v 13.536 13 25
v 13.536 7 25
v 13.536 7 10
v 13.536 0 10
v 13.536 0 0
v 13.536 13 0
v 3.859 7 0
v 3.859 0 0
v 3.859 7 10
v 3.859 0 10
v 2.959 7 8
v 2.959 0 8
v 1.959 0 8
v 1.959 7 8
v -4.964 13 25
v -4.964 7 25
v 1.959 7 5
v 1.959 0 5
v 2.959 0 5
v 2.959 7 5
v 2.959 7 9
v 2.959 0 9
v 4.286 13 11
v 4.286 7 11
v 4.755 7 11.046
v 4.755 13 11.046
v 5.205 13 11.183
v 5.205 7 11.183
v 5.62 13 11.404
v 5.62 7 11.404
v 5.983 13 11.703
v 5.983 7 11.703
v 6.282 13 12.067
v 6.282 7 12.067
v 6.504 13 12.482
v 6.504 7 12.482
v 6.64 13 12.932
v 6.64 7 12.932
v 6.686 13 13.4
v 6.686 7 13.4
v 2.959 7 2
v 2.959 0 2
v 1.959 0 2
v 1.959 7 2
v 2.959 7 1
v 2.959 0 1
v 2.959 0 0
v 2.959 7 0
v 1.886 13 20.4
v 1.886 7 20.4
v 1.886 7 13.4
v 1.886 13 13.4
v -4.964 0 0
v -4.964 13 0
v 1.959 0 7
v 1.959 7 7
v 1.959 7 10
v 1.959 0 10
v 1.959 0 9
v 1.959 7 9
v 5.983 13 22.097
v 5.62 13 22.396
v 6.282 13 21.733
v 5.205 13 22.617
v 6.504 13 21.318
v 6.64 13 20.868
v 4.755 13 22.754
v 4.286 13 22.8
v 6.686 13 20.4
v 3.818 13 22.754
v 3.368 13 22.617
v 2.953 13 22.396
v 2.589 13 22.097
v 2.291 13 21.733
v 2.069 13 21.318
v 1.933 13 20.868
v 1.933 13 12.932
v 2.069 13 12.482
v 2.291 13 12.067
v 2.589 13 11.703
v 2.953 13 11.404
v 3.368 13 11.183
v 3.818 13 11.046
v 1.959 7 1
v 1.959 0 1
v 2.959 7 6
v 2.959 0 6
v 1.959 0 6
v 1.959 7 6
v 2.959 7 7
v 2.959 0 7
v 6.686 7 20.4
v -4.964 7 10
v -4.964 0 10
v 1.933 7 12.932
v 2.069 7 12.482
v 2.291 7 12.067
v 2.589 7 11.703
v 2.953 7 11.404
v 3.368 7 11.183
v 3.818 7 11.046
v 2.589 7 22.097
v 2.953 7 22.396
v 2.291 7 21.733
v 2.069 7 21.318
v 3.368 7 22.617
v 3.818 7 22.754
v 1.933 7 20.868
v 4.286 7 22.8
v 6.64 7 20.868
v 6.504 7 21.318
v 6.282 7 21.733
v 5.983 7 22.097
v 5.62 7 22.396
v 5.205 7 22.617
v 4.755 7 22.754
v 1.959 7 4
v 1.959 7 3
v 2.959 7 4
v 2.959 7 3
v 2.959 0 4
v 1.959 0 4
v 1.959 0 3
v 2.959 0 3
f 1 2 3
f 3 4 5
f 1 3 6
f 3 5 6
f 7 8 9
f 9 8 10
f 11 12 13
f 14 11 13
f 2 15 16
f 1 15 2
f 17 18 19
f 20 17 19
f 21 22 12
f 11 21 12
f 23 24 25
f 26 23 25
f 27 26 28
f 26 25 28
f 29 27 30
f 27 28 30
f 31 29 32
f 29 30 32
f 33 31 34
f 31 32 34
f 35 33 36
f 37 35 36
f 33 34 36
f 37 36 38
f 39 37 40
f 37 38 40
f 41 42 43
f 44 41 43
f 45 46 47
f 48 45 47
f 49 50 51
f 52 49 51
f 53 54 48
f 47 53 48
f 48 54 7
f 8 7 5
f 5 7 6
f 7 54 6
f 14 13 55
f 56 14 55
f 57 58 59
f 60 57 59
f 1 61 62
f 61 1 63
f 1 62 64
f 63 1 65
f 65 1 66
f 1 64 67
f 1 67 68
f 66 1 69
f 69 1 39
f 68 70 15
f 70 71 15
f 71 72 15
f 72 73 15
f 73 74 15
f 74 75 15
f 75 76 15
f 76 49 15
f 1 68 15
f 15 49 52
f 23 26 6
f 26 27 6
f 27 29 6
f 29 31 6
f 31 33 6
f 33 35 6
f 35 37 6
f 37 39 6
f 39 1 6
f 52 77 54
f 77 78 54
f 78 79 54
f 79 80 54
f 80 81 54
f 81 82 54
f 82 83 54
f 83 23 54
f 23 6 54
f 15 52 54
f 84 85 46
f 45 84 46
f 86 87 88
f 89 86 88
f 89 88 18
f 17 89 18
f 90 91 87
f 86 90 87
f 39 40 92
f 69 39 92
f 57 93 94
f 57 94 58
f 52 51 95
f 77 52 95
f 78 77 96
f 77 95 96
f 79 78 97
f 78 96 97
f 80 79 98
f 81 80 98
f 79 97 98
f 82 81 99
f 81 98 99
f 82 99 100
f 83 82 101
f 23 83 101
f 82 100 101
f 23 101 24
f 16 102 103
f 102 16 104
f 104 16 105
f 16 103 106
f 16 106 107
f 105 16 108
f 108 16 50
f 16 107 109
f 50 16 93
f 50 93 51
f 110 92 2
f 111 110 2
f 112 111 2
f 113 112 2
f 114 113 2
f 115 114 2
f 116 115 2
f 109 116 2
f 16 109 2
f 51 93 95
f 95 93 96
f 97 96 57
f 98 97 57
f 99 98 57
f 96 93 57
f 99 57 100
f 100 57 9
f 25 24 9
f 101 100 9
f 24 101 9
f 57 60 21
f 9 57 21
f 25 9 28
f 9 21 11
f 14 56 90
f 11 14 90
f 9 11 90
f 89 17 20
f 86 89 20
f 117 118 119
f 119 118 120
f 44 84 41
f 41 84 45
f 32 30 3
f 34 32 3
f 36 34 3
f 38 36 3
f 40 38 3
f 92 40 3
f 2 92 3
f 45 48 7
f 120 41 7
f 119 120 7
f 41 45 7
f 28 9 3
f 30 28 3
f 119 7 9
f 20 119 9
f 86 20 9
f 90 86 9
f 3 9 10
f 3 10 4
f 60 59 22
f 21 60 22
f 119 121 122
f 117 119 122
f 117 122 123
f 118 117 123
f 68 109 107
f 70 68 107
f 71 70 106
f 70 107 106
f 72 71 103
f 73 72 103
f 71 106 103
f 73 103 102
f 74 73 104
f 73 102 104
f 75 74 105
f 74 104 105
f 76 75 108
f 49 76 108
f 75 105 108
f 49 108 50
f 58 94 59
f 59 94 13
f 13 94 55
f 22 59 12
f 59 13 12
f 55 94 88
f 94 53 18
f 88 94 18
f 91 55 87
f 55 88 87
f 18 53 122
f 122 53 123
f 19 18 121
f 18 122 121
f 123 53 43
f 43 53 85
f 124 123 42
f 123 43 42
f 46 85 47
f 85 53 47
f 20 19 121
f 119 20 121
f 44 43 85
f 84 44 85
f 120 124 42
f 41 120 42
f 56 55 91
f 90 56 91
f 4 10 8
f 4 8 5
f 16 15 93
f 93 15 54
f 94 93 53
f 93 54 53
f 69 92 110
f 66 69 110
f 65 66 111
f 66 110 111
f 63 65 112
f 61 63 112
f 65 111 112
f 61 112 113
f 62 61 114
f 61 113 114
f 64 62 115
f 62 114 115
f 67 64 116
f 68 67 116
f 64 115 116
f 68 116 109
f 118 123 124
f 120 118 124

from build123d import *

# Parameters (mm, degrees)
F0_W     = 18.5
F0_H     = 5
F0_W_2   = 3
F0_H_2   = 0.95
F1_DEPTH = 10
F3_DEPTH = 7
F5_DEPTH = 15
F7_DEPTH = 25


with BuildPart() as f1:
    # F0 (on Top) → F1 (new body)
    with BuildSketch(Plane.XY):
        with Locations((4.286429, 2.5)):
            Rectangle(F0_W, F0_H)
        Polygon((-4.963571, 12.05), (-4.963571, 5), (13.536429, 5), (13.536429, 12.05), (10.536429, 12.05), (10.536429, 13), (-1.963571, 13), (-1.963571, 12.05), align=None)
        with Locations((-3.463571, 12.525)):
            Rectangle(F0_W_2, F0_H_2)
        with Locations((12.036429, 12.525)):
            Rectangle(F0_W_2, F0_H_2)
    extrude(amount=F1_DEPTH)

    # F2 (on face) → F3 (cut)
    with BuildSketch(Plane.XZ):
        Polygon((3.859359, 10), (1.959359, 10), (1.959359, 9), (2.959359, 9), (2.959359, 8), (1.959359, 8), (1.959359, 7), (2.959359, 7), (2.959359, 6), (1.959359, 6), (1.959359, 5), (2.959359, 5), (2.959359, 4), (1.959359, 4), (1.959359, 3), (2.959359, 3), (2.959359, 2), (1.959359, 2), (1.959359, 1), (2.959359, 1), (2.959359, 0), (3.859359, 0), align=None)
    extrude(amount=-F3_DEPTH, mode=Mode.SUBTRACT)

    # F4 (on face) → F5 (join)
    with BuildSketch(Plane.XY.offset(10)):
        Polygon((-4.963571, 13), (-4.963571, 7), (1.959359, 7), (3.859359, 7), (13.536429, 7), (13.536429, 13), align=None)
    extrude(amount=F5_DEPTH)

    # F6 (on face) → F7 (cut)
    with BuildSketch(Plane.XZ.offset(-7)):
        with BuildLine():
            Line((6.686429, 13.4), (6.686429, 20.4))
            ThreePointArc((6.686429, 20.4), (5.983486, 22.097056), (4.286429, 22.8))
            ThreePointArc((4.286429, 22.8), (2.589373, 22.097056), (1.886429, 20.4))
            Line((1.886429, 20.4), (1.886429, 13.4))
            ThreePointArc((1.886429, 13.4), (2.589373, 11.702944), (4.286429, 11))
            ThreePointArc((4.286429, 11), (5.983486, 11.702944), (6.686429, 13.4))
        make_face()
    extrude(amount=-F7_DEPTH, mode=Mode.SUBTRACT)


solid = f1.part
